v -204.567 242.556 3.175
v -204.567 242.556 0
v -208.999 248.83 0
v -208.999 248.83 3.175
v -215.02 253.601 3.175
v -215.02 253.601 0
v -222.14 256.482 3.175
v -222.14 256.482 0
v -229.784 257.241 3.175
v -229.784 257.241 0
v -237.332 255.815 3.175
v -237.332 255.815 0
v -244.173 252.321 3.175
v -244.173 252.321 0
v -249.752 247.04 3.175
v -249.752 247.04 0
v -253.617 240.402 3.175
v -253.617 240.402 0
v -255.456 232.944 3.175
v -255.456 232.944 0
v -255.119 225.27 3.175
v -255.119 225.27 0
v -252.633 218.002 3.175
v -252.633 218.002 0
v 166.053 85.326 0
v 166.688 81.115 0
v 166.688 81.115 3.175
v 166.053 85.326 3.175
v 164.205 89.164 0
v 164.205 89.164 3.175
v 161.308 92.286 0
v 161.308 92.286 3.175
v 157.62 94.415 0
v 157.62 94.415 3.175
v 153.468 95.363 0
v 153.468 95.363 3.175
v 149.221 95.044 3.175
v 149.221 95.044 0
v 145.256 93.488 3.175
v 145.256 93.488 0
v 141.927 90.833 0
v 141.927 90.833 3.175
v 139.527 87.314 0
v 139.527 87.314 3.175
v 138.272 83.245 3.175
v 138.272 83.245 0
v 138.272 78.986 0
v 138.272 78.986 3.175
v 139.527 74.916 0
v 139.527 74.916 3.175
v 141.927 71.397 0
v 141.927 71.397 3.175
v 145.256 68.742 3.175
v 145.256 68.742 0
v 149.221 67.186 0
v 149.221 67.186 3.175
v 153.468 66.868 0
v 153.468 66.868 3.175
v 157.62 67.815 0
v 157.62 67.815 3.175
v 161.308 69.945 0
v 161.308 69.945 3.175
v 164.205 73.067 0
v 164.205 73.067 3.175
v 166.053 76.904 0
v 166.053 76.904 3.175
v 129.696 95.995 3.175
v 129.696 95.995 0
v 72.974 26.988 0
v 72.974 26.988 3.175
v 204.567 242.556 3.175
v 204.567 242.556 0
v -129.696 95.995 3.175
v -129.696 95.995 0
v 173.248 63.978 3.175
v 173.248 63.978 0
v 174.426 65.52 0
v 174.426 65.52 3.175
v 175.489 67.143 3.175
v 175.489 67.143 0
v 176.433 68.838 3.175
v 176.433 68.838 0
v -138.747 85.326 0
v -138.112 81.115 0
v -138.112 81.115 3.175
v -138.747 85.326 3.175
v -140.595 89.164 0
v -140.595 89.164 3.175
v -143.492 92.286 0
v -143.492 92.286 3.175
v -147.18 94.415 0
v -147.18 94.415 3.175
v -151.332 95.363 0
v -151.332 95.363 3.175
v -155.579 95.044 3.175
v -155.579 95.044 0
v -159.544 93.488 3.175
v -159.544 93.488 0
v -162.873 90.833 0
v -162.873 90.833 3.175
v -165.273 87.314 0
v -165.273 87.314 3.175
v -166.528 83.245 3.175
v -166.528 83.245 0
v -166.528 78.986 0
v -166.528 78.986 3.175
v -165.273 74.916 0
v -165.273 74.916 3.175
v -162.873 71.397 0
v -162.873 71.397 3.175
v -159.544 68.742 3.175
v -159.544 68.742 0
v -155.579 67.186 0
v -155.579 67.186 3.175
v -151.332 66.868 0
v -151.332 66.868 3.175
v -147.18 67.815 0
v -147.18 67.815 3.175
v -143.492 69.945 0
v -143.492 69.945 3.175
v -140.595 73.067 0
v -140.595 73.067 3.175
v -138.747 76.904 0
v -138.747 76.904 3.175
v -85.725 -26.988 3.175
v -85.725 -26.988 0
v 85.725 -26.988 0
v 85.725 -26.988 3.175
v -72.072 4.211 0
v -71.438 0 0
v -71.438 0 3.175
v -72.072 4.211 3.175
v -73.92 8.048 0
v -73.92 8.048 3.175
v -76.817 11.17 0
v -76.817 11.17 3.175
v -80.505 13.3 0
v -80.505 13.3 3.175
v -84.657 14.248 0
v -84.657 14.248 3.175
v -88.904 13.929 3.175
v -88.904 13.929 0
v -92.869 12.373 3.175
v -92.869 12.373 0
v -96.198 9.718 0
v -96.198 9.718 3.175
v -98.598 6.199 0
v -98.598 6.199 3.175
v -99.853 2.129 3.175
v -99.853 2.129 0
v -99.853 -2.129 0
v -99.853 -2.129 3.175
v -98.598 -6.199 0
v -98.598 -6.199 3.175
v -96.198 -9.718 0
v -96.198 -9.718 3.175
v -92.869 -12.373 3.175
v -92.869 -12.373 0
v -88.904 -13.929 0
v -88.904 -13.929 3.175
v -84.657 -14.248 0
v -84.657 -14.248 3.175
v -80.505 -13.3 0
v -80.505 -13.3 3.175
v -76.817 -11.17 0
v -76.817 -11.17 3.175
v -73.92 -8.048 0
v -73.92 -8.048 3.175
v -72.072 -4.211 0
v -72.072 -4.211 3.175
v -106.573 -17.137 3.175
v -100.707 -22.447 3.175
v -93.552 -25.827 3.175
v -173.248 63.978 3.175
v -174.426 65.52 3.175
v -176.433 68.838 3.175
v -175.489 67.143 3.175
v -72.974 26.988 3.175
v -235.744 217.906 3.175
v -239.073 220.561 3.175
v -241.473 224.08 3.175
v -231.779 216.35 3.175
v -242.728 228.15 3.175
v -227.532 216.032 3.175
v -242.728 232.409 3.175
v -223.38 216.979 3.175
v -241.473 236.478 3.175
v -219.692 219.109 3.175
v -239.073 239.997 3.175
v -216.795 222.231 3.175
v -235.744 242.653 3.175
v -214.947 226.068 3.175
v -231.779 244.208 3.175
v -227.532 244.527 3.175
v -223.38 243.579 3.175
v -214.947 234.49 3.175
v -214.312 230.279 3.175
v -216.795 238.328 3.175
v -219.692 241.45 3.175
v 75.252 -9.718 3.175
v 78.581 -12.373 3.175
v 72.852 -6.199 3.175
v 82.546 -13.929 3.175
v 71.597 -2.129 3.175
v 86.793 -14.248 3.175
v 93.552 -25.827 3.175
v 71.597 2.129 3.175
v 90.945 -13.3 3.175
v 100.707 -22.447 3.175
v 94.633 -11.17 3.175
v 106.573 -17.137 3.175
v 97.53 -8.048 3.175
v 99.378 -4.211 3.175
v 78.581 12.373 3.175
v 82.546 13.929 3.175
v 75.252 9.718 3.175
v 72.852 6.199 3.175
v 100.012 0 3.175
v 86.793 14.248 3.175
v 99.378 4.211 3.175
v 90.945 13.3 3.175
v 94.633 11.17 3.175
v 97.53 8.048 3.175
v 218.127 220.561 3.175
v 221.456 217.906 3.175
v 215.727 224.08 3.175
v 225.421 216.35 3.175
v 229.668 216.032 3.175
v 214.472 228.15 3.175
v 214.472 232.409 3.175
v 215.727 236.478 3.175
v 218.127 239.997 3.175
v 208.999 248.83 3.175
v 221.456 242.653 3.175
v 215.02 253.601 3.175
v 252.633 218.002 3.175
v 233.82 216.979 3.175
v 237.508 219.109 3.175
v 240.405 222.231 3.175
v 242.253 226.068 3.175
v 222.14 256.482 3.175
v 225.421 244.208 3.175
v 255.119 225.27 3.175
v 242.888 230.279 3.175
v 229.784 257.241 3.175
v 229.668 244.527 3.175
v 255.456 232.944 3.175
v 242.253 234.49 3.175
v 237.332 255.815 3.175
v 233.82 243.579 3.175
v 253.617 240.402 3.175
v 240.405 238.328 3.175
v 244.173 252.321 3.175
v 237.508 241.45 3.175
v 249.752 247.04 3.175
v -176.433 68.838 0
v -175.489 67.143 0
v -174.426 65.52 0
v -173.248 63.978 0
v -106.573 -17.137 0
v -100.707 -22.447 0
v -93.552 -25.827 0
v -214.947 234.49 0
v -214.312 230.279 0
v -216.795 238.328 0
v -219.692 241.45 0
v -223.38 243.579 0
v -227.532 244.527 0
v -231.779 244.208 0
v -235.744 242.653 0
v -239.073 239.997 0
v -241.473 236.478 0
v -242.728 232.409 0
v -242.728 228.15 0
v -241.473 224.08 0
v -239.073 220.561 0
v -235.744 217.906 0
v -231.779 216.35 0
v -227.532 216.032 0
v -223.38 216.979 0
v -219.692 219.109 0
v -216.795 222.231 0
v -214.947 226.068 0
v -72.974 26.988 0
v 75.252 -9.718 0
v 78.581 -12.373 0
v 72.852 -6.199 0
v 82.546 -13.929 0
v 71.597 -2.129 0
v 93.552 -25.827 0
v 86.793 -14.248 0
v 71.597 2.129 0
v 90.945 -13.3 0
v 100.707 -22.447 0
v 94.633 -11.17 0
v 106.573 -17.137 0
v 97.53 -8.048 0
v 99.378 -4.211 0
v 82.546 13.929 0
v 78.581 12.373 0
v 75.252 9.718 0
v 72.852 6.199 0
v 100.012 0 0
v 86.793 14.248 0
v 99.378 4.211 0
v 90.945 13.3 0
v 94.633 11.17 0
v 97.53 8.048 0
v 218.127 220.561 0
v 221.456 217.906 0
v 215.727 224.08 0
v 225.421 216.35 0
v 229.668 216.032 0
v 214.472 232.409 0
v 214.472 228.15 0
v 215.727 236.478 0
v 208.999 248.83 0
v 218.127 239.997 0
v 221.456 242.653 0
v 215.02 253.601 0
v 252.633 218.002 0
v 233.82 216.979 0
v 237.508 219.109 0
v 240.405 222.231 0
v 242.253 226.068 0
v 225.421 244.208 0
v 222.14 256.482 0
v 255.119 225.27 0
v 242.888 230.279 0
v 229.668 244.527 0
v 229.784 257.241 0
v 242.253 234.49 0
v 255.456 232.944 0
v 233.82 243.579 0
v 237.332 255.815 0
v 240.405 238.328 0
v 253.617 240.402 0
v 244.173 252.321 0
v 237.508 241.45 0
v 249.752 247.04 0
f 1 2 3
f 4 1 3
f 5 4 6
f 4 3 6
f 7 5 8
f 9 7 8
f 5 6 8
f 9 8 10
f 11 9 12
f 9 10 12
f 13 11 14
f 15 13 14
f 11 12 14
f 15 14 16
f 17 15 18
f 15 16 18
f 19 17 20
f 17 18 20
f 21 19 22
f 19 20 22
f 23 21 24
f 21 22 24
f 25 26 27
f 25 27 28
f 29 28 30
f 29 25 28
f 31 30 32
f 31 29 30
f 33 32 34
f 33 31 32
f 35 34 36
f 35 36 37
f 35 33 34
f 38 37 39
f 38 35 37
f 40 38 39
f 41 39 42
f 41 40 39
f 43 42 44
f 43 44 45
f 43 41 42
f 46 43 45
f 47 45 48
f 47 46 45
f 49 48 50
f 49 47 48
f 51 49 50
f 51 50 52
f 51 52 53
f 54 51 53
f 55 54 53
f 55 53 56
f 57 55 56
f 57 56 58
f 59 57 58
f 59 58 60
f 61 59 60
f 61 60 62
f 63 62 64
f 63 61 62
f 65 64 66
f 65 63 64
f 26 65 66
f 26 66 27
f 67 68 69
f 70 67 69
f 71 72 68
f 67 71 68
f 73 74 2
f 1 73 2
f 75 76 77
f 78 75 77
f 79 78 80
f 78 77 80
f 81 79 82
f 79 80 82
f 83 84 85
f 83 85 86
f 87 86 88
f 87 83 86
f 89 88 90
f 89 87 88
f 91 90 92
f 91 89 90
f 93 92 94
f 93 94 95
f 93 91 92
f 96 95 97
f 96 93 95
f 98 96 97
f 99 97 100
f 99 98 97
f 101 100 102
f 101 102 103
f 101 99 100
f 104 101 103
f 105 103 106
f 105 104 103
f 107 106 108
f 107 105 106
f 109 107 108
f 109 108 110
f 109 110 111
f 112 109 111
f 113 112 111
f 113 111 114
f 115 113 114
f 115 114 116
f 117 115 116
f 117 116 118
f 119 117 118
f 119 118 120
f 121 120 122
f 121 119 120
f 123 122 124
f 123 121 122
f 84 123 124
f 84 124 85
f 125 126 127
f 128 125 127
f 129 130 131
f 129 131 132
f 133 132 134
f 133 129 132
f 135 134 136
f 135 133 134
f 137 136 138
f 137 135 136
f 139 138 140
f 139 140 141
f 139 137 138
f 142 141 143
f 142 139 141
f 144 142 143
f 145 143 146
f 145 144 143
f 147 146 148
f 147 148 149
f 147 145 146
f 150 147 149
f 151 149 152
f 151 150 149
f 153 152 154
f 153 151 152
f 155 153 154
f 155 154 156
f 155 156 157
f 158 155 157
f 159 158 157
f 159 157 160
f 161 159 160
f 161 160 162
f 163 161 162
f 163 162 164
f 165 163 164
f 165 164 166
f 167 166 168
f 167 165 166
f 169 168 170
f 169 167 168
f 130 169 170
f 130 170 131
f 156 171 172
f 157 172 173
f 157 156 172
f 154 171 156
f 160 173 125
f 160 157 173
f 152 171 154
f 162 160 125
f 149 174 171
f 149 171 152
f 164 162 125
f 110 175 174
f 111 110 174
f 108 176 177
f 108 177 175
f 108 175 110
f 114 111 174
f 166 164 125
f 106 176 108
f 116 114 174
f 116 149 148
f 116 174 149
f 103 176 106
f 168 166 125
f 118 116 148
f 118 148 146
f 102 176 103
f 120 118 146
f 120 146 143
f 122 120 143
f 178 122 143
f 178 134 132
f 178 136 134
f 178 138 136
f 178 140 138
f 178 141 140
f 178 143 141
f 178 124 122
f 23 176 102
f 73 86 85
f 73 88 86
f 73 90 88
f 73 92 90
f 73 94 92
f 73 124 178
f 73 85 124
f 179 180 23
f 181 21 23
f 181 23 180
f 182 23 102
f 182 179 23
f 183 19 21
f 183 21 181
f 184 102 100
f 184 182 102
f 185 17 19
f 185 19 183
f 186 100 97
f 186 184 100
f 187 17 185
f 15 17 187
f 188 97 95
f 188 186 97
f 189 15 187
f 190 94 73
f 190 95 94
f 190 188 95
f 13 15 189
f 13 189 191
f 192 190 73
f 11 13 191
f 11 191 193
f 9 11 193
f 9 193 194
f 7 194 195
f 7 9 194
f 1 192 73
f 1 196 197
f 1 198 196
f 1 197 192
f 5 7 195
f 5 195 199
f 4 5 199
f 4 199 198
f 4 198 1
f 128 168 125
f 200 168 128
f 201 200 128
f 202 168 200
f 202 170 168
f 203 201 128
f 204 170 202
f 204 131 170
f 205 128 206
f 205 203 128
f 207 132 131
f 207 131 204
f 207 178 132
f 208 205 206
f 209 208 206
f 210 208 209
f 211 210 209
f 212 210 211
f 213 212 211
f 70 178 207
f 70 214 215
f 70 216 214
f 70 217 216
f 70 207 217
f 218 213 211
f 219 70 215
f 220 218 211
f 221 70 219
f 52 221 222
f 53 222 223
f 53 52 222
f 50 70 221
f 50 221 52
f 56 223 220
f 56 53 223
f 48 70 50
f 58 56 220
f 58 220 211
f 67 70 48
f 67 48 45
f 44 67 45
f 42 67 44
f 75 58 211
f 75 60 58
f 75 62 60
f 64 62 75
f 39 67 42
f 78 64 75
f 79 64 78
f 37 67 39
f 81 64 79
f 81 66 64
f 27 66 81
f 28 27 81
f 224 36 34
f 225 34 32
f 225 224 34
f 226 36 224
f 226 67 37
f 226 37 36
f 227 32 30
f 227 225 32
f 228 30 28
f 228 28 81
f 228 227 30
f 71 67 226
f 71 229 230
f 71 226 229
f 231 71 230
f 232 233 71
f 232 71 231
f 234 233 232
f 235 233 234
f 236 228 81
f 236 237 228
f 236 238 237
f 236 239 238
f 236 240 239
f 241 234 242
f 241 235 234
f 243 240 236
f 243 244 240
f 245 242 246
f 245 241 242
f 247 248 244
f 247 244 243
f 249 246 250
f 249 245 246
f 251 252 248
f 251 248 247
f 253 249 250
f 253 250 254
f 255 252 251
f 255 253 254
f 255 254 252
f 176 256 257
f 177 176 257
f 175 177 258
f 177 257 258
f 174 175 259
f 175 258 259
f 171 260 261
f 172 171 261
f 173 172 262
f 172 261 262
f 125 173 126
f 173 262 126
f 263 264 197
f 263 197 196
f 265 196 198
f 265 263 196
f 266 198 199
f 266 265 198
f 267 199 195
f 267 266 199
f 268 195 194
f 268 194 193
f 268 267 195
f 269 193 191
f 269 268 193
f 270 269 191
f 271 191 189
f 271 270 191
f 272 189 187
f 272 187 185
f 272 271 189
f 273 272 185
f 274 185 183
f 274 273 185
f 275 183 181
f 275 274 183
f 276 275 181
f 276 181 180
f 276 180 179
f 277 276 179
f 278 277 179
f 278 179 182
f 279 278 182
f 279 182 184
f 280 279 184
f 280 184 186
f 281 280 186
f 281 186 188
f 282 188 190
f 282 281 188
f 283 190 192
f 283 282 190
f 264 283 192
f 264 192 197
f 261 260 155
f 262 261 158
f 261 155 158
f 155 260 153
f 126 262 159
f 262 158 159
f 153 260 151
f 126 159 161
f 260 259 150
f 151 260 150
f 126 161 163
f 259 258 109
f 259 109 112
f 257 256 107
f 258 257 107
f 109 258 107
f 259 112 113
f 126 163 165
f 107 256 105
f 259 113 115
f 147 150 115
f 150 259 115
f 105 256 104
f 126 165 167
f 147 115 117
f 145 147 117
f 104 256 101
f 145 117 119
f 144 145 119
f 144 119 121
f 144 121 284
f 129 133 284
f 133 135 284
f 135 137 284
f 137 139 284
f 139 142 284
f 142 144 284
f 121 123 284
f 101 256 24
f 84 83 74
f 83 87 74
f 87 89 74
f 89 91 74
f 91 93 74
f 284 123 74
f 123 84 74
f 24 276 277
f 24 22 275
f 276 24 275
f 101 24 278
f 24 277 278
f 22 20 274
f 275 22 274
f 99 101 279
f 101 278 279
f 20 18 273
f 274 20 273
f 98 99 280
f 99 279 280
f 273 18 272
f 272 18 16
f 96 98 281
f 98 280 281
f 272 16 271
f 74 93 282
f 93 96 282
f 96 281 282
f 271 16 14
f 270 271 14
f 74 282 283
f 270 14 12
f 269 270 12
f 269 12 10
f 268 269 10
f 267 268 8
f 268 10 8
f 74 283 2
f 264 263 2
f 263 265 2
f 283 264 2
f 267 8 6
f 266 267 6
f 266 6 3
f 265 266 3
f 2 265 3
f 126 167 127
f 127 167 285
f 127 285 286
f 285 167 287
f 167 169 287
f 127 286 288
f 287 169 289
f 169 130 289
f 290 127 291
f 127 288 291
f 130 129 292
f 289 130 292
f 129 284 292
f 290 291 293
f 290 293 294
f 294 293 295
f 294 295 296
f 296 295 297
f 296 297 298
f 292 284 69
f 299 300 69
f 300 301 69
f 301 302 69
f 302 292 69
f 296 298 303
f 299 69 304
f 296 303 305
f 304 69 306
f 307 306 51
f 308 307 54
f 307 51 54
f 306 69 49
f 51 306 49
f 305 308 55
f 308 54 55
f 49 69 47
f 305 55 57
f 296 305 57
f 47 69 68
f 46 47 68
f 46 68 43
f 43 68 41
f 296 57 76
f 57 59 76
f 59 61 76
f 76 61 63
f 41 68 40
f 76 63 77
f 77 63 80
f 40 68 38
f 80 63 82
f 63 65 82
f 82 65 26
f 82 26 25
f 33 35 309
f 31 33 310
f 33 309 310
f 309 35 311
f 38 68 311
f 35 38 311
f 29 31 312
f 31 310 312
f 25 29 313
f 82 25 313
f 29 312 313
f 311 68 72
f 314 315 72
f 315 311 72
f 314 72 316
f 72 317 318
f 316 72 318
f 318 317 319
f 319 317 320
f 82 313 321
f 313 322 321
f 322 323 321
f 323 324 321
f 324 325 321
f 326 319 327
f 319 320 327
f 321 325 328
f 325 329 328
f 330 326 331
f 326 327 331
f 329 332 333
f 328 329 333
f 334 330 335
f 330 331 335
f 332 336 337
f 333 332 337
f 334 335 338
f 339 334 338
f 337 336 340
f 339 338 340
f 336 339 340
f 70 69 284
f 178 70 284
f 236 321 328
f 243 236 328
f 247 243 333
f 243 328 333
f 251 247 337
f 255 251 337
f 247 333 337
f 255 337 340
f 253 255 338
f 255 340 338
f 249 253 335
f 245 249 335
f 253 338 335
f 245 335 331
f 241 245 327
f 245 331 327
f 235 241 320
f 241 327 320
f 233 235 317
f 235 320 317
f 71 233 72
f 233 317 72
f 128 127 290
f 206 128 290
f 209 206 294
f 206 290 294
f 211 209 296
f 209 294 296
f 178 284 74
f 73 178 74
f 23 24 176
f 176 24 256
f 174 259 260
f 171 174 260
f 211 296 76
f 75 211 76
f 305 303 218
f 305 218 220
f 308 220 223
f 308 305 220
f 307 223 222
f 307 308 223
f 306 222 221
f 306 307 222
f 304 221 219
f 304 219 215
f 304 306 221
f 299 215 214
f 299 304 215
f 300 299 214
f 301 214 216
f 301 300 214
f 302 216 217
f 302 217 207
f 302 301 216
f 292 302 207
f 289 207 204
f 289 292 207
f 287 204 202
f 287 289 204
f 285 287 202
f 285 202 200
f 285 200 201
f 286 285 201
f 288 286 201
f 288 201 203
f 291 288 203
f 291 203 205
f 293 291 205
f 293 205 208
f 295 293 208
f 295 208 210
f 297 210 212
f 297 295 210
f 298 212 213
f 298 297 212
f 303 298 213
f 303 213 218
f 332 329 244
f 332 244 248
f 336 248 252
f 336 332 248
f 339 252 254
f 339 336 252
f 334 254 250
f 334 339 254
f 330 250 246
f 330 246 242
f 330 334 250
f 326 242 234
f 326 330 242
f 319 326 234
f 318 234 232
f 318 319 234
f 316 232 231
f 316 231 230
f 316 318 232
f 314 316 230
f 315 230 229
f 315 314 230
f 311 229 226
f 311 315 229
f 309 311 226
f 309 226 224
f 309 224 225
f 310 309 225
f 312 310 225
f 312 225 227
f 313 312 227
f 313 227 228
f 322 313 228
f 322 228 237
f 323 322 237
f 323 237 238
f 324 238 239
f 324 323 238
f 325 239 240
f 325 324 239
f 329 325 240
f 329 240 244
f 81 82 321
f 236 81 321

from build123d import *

# Parameters (mm, degrees)
SKETCH2_R           = 14.2875
BOSS_EXTRUDE1_DEPTH = 3.175


with BuildPart() as part:
    # Sketch2 → Boss-Extrude1 (new body)
    with BuildSketch(Plane.XY):
        with BuildLine():
            Line((-252.633177849, 218.001908783), (-176.433177849, 68.837869886))
            ThreePointArc((-176.433177849, 68.837869886), (-174.97190788, 66.322103076), (-173.24831347, 63.978256905))
            Line((-173.24831347, 63.978256905), (-106.57331347, -17.136889499))
            ThreePointArc((-106.57331347, -17.136889499), (-97.254166295, -24.400890984), (-85.725, -26.9875))
            Line((-85.725, -26.9875), (85.725, -26.9875))
            ThreePointArc((85.725, -26.9875), (97.254166295, -24.400890984), (106.57331347, -17.136889499))
            Line((106.57331347, -17.136889499), (173.24831347, 63.978256905))
            ThreePointArc((173.24831347, 63.978256905), (174.97190788, 66.322103076), (176.433177849, 68.837869886))
            Line((176.433177849, 68.837869886), (252.633177849, 218.001908783))
            ThreePointArc((252.633177849, 218.001908783), (240.877276518, 254.31236315), (204.566822151, 242.556461819))
            Line((204.566822151, 242.556461819), (129.696163279, 95.994652474))
            Line((129.696163279, 95.994652474), (72.973687944, 26.9875))
            Line((72.973687944, 26.9875), (-72.973687944, 26.9875))
            Line((-72.973687944, 26.9875), (-129.696163279, 95.994652474))
            Line((-129.696163279, 95.994652474), (-204.566822151, 242.556461819))
            ThreePointArc((-204.566822151, 242.556461819), (-240.877276518, 254.31236315), (-252.633177849, 218.001908783))
        make_face()
        with Locations((-228.6, 230.279185301)):
            Circle(SKETCH2_R, mode=Mode.SUBTRACT)
        with Locations((-152.4, 81.115146404)):
            Circle(SKETCH2_R, mode=Mode.SUBTRACT)
        with Locations((-85.725, 0)):
            Circle(SKETCH2_R, mode=Mode.SUBTRACT)
        with Locations((85.725, 0)):
            Circle(SKETCH2_R, mode=Mode.SUBTRACT)
        with Locations((152.4, 81.115146404)):
            Circle(SKETCH2_R, mode=Mode.SUBTRACT)
        with Locations((228.6, 230.279185301)):
            Circle(SKETCH2_R, mode=Mode.SUBTRACT)
    extrude(amount=BOSS_EXTRUDE1_DEPTH)


solid = part.part
